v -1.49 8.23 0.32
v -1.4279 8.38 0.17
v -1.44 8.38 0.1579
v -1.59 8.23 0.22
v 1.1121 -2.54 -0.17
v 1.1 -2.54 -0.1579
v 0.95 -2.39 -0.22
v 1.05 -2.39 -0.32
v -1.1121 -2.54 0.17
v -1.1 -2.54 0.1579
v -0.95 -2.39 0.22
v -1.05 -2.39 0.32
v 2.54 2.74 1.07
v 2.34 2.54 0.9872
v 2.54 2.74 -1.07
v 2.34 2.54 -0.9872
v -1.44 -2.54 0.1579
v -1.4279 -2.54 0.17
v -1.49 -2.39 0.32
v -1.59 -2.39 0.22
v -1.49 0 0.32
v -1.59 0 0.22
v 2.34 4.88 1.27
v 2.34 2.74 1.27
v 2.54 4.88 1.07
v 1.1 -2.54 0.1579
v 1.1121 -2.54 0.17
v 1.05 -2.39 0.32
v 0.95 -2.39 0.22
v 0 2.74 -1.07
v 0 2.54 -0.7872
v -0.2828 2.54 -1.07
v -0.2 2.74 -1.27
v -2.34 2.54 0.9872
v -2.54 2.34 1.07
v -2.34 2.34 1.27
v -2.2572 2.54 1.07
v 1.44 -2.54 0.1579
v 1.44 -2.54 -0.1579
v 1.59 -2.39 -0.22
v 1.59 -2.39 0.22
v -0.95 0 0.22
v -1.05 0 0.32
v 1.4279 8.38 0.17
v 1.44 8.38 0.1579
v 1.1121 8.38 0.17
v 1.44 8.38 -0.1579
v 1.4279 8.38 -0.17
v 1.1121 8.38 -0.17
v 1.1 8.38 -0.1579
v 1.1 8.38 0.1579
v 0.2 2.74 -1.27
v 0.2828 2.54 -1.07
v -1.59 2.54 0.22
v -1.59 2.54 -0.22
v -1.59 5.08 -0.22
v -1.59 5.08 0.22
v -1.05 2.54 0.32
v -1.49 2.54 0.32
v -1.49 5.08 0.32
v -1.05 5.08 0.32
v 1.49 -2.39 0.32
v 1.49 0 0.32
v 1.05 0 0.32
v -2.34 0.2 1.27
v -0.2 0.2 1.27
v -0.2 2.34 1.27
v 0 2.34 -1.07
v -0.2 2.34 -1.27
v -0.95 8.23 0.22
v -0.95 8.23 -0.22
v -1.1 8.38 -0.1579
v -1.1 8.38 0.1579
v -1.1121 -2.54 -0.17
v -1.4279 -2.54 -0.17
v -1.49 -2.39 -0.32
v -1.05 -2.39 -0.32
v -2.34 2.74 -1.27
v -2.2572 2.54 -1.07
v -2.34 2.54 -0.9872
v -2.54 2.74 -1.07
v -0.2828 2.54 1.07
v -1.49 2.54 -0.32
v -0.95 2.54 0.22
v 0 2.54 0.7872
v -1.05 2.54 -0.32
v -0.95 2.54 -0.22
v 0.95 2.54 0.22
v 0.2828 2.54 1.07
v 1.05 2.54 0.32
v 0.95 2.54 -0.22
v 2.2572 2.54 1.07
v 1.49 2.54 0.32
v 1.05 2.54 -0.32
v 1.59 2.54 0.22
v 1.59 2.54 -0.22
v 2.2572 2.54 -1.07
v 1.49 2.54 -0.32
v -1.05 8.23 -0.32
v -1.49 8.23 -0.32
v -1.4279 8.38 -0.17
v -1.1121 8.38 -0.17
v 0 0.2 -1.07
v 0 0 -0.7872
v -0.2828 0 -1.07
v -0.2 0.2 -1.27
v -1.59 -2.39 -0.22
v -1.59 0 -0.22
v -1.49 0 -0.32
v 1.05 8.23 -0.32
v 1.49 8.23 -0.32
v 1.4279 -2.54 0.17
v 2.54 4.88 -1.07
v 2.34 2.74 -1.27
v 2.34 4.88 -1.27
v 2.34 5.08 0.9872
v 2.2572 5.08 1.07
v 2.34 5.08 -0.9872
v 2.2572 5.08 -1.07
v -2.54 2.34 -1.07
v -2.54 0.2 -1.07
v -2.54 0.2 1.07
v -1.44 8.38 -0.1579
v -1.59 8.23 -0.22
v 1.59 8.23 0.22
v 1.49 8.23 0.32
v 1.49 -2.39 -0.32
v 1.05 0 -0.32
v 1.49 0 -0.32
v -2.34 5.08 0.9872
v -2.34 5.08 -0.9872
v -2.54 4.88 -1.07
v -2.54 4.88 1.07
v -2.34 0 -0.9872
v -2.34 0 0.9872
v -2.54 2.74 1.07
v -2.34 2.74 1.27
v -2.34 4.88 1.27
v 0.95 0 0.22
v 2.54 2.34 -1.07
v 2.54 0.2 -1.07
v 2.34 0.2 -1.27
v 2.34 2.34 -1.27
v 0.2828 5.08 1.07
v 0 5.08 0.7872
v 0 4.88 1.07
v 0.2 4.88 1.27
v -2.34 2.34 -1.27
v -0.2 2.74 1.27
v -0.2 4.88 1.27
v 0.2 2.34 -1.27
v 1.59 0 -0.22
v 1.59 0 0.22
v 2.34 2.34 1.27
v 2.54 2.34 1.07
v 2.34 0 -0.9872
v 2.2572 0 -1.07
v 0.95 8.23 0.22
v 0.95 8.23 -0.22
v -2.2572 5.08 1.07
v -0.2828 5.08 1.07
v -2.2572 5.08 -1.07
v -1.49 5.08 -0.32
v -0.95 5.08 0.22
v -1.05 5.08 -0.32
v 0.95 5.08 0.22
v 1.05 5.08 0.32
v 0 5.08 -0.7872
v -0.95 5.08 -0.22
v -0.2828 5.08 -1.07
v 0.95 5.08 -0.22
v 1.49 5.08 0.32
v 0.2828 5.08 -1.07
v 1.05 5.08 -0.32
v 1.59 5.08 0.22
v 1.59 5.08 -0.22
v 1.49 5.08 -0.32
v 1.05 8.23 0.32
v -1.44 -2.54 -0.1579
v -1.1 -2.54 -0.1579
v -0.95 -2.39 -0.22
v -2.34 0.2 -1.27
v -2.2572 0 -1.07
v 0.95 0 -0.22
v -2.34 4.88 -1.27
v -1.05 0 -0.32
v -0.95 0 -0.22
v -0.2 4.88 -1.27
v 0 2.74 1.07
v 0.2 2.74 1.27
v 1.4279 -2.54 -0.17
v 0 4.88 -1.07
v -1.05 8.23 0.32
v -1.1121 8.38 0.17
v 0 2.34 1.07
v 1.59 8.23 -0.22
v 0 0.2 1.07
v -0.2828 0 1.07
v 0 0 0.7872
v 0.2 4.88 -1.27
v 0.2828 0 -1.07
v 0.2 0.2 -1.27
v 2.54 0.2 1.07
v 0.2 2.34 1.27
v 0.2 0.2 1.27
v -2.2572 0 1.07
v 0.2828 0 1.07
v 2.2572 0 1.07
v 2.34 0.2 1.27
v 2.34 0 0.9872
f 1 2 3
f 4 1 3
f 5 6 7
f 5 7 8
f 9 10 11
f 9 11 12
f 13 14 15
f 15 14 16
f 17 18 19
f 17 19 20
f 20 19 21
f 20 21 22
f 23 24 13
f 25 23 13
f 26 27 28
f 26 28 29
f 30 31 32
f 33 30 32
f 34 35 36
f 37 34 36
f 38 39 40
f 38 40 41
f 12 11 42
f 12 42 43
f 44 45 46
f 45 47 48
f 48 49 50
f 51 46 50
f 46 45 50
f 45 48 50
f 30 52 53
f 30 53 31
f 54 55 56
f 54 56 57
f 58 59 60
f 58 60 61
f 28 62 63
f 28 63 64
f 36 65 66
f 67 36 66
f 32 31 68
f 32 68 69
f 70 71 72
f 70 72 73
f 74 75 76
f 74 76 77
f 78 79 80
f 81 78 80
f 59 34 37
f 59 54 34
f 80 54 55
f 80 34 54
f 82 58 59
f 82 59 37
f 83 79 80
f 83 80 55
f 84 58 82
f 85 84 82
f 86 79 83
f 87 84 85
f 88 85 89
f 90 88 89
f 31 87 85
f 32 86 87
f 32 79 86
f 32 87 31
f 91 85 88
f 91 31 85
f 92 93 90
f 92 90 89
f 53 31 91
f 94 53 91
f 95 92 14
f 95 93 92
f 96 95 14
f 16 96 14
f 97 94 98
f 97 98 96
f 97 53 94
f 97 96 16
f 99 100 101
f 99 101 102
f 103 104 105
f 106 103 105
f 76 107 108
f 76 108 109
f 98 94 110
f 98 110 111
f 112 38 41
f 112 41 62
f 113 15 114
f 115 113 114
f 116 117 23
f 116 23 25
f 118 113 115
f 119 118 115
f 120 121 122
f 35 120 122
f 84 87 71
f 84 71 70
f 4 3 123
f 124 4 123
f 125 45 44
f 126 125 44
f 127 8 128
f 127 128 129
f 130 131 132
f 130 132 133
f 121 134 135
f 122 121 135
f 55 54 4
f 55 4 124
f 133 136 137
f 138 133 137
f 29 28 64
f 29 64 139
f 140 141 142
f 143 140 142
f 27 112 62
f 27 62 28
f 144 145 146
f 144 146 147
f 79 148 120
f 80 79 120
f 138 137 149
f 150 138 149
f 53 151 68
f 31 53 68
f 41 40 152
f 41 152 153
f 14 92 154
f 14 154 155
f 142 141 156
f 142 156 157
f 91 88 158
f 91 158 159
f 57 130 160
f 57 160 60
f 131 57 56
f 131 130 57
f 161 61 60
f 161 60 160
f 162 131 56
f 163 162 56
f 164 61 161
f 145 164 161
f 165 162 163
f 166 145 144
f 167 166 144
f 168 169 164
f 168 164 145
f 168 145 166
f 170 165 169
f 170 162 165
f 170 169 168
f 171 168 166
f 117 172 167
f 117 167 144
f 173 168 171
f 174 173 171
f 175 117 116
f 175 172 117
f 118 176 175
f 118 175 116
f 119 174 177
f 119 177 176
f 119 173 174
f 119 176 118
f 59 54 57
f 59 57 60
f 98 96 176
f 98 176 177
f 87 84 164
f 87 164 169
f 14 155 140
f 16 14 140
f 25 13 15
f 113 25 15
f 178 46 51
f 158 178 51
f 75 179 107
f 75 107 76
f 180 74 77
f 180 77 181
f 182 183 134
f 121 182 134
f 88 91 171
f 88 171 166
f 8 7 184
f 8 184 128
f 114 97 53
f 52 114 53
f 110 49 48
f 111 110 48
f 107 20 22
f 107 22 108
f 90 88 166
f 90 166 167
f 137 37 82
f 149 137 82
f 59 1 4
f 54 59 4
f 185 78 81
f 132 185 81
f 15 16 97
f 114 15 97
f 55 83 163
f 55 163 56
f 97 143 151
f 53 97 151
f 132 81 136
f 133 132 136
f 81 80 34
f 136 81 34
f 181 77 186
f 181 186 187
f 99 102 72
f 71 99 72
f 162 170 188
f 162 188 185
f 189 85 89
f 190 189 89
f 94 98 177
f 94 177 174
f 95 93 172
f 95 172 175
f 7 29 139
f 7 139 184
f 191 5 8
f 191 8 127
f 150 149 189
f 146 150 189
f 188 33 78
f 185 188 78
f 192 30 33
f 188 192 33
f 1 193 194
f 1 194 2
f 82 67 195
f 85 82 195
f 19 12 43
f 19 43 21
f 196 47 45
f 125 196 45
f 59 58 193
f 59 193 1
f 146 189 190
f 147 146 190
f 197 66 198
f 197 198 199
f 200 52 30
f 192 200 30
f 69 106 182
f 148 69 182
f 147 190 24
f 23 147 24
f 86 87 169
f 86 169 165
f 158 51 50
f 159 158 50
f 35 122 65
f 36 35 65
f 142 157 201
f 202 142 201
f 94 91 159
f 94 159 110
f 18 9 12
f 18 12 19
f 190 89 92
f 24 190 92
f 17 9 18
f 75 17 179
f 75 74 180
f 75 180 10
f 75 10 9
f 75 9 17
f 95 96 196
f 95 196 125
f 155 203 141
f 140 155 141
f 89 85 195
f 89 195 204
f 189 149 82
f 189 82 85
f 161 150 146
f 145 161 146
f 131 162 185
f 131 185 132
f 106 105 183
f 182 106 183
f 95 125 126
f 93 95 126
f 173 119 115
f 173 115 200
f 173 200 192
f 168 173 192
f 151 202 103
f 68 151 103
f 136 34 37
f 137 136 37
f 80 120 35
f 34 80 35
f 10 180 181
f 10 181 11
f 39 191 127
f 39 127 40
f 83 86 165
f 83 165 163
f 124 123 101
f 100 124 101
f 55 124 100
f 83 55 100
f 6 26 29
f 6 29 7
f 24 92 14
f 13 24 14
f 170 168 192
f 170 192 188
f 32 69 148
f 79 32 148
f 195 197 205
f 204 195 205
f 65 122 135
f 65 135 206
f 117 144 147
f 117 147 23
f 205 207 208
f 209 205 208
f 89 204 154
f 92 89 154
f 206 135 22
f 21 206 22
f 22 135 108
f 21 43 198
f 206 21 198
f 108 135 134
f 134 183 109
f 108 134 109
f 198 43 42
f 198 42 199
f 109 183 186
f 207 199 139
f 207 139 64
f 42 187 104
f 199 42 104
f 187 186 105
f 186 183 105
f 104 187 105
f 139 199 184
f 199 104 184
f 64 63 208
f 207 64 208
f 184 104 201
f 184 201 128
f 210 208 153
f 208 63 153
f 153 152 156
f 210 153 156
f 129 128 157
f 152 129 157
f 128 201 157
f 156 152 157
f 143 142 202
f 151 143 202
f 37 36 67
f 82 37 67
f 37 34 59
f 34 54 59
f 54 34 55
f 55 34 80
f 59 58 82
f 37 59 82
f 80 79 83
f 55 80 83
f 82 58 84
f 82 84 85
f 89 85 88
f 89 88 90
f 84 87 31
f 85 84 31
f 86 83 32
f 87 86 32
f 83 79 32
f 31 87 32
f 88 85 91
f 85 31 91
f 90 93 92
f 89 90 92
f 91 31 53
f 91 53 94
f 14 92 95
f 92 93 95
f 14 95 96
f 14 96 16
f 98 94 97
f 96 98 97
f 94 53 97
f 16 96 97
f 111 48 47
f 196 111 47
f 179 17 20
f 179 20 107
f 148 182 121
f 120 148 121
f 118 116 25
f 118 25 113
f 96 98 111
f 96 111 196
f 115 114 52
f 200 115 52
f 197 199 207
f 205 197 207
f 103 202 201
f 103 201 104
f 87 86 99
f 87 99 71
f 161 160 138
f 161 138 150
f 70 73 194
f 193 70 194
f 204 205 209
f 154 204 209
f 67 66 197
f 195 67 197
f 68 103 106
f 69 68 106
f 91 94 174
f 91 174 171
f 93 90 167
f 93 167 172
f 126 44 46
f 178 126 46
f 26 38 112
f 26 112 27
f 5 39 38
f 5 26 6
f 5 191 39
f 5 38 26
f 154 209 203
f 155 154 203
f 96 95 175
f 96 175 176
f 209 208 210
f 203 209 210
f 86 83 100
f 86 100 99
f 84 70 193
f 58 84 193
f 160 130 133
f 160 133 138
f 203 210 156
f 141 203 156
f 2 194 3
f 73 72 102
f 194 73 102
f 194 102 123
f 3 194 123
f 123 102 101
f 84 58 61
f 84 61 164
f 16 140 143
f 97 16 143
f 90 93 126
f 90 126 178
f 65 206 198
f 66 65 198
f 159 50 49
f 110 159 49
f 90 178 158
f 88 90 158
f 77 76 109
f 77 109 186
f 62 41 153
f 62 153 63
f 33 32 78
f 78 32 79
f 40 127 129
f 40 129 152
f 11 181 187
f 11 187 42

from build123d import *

# Parameters (mm, degrees)
EXTRUDE_1_DEPTH   = 2.54
EXTRUDE_1_2_DEPTH = 2.54
EXTRUDE_2_DEPTH   = 8.38
EXTRUDE_3_DEPTH   = 2.54
EXTRUDE_START     = 2.54
EXTRUDE_4_DEPTH   = 2.54
CHAMFER_1_SIZE    = 0.15
CHAMFER_2_SIZE    = 0.2
CHAMFER_3_SIZE    = 0.2


with BuildPart() as part:
    # Эскиз1 → Бобышка-Вытянуть1 (new body)
    with BuildSketch(Plane(origin=(0, 0, 0), x_dir=(1, 0, 0), z_dir=(0, 1, 0))):
        Polygon((-1.49, 0.32), (-1.59, 0.22), (-1.59, -0.22), (-1.49, -0.32), (-1.05, -0.32), (-0.95, -0.22), (-0.95, 0.22), (-1.05, 0.32), align=None)
    extrude(amount=-EXTRUDE_1_DEPTH)



with BuildPart() as body_2:
    # Эскиз1 → Extrude 1 2 (new body)
    with BuildSketch(Plane(origin=(0, 0, 0), x_dir=(1, 0, 0), z_dir=(0, 1, 0))):
        Polygon((1.05, 0.32), (0.95, 0.22), (0.95, -0.22), (1.05, -0.32), (1.49, -0.32), (1.59, -0.22), (1.59, 0.22), (1.49, 0.32), align=None)
    extrude(amount=-EXTRUDE_1_2_DEPTH)


with BuildPart() as part_1:
    add(part.part)

    add(body_2.part)  # Бобышка-Вытянуть2 merges body 2
    # Эскиз1<3> → Бобышка-Вытянуть2 (add)
    with BuildSketch(Plane(origin=(0, 0, 0), x_dir=(1, 0, 0), z_dir=(0, 1, 0))):
        Polygon((-1.49, 0.32), (-1.59, 0.22), (-1.59, -0.22), (-1.49, -0.32), (-1.05, -0.32), (-0.95, -0.22), (-0.95, 0.22), (-1.05, 0.32), align=None)
        Polygon((1.05, 0.32), (0.95, 0.22), (0.95, -0.22), (1.05, -0.32), (1.49, -0.32), (1.59, -0.22), (1.59, 0.22), (1.49, 0.32), align=None)
    extrude(amount=EXTRUDE_2_DEPTH)

    # Эскиз1<4> → Бобышка-Вытянуть3 (add)
    with BuildSketch(Plane(origin=(0, 0, 0), x_dir=(1, 0, 0), z_dir=(0, 1, 0))):
        Polygon((-0.2, 1.27), (-2.34, 1.27), (-2.54, 1.07), (-2.54, -1.07), (-2.34, -1.27), (-0.2, -1.27), (0, -1.07), (0.2, -1.27), (2.34, -1.27), (2.54, -1.07), (2.54, 1.07), (2.34, 1.27), (0.2, 1.27), (0, 1.07), align=None)
        Polygon((-1.59, -0.22), (-1.59, 0.22), (-1.49, 0.32), (-1.05, 0.32), (-0.95, 0.22), (-0.95, -0.22), (-1.05, -0.32), (-1.49, -0.32), align=None, mode=Mode.SUBTRACT)
        Polygon((0.95, 0.22), (1.05, 0.32), (1.49, 0.32), (1.59, 0.22), (1.59, -0.22), (1.49, -0.32), (1.05, -0.32), (0.95, -0.22), align=None, mode=Mode.SUBTRACT)
    extrude(amount=EXTRUDE_3_DEPTH)

    # Фаска1
    chamfer_1_edges = [part_1.edges().sort_by_distance(p)[0] for p in [
        (-1.54, -2.54, 0.27),
        (-1.27, -2.54, 0.32),
        (-1, -2.54, 0.27),
        (-0.95, -2.54, 0),
        (-1, -2.54, -0.27),
        (-1.27, -2.54, -0.32),
        (-1.54, -2.54, -0.27),
        (-1.59, -2.54, 0),
        (1, -2.54, 0.27),
        (1.27, -2.54, 0.32),
        (1.54, -2.54, 0.27),
        (1.59, -2.54, 0),
        (1.54, -2.54, -0.27),
        (1.27, -2.54, -0.32),
        (1, -2.54, -0.27),
        (0.95, -2.54, 0),
        (1, 8.38, -0.27),
        (1.27, 8.38, -0.32),
        (1.54, 8.38, -0.27),
        (1.59, 8.38, 0),
        (1.54, 8.38, 0.27),
        (1.27, 8.38, 0.32),
        (1, 8.38, 0.27),
        (0.95, 8.38, 0),
        (-1.54, 8.38, -0.27),
        (-1.27, 8.38, -0.32),
        (-1, 8.38, -0.27),
        (-0.95, 8.38, 0),
        (-1, 8.38, 0.27),
        (-1.27, 8.38, 0.32),
        (-1.54, 8.38, 0.27),
        (-1.59, 8.38, 0),
    ]]
    chamfer(chamfer_1_edges, length=CHAMFER_1_SIZE)

    # Фаска2
    chamfer_2_edges = [part_1.edges().sort_by_distance(p)[0] for p in [
        (-2.44, 2.54, -1.17),
        (-1.27, 2.54, -1.27),
        (-0.1, 2.54, -1.17),
        (0.1, 2.54, -1.17),
        (1.27, 2.54, -1.27),
        (2.44, 2.54, -1.17),
        (2.54, 2.54, 0),
        (2.44, 2.54, 1.17),
        (1.27, 2.54, 1.27),
        (0.1, 2.54, 1.17),
        (-0.1, 2.54, 1.17),
        (-1.27, 2.54, 1.27),
        (-2.44, 2.54, 1.17),
        (-2.54, 2.54, 0),
        (-2.44, 0, 1.17),
        (-1.27, 0, 1.27),
        (-0.1, 0, 1.17),
        (0.1, 0, 1.17),
        (1.27, 0, 1.27),
        (2.44, 0, 1.17),
        (2.54, 0, 0),
        (2.44, 0, -1.17),
        (1.27, 0, -1.27),
        (0.1, 0, -1.17),
        (-0.1, 0, -1.17),
        (-1.27, 0, -1.27),
        (-2.44, 0, -1.17),
        (-2.54, 0, 0),
    ]]
    chamfer(chamfer_2_edges, length=CHAMFER_2_SIZE)


with BuildPart() as body_2_2:
    # Эскиз1<5> → Бобышка-Вытянуть4 (new body)
    with BuildSketch(Plane(origin=(0, 0, 0), x_dir=(1, 0, 0), z_dir=(0, 1, 0)).offset(EXTRUDE_START)):
        Polygon((-0.2, 1.27), (-2.34, 1.27), (-2.54, 1.07), (-2.54, -1.07), (-2.34, -1.27), (-0.2, -1.27), (0, -1.07), (0.2, -1.27), (2.34, -1.27), (2.54, -1.07), (2.54, 1.07), (2.34, 1.27), (0.2, 1.27), (0, 1.07), align=None)
        Polygon((-1.59, -0.22), (-1.59, 0.22), (-1.49, 0.32), (-1.05, 0.32), (-0.95, 0.22), (-0.95, -0.22), (-1.05, -0.32), (-1.49, -0.32), align=None, mode=Mode.SUBTRACT)
        Polygon((0.95, 0.22), (1.05, 0.32), (1.49, 0.32), (1.59, 0.22), (1.59, -0.22), (1.49, -0.32), (1.05, -0.32), (0.95, -0.22), align=None, mode=Mode.SUBTRACT)
    extrude(amount=EXTRUDE_4_DEPTH)

    # Фаска3
    chamfer_3_edges = [body_2_2.edges().sort_by_distance(p)[0] for p in [
        (-2.44, 5.08, -1.17),
        (-1.27, 5.08, -1.27),
        (-0.1, 5.08, -1.17),
        (0.1, 5.08, -1.17),
        (1.27, 5.08, -1.27),
        (2.44, 5.08, -1.17),
        (2.54, 5.08, 0),
        (2.44, 5.08, 1.17),
        (1.27, 5.08, 1.27),
        (0.1, 5.08, 1.17),
        (-0.1, 5.08, 1.17),
        (-1.27, 5.08, 1.27),
        (-2.44, 5.08, 1.17),
        (-2.54, 5.08, 0),
        (-2.44, 2.54, 1.17),
        (-1.27, 2.54, 1.27),
        (-0.1, 2.54, 1.17),
        (0.1, 2.54, 1.17),
        (1.27, 2.54, 1.27),
        (2.44, 2.54, 1.17),
        (2.54, 2.54, 0),
        (2.44, 2.54, -1.17),
        (1.27, 2.54, -1.27),
        (0.1, 2.54, -1.17),
        (-0.1, 2.54, -1.17),
        (-1.27, 2.54, -1.27),
        (-2.44, 2.54, -1.17),
        (-2.54, 2.54, 0),
    ]]
    chamfer(chamfer_3_edges, length=CHAMFER_3_SIZE)


solid = Compound([part_1.part, body_2_2.part])
